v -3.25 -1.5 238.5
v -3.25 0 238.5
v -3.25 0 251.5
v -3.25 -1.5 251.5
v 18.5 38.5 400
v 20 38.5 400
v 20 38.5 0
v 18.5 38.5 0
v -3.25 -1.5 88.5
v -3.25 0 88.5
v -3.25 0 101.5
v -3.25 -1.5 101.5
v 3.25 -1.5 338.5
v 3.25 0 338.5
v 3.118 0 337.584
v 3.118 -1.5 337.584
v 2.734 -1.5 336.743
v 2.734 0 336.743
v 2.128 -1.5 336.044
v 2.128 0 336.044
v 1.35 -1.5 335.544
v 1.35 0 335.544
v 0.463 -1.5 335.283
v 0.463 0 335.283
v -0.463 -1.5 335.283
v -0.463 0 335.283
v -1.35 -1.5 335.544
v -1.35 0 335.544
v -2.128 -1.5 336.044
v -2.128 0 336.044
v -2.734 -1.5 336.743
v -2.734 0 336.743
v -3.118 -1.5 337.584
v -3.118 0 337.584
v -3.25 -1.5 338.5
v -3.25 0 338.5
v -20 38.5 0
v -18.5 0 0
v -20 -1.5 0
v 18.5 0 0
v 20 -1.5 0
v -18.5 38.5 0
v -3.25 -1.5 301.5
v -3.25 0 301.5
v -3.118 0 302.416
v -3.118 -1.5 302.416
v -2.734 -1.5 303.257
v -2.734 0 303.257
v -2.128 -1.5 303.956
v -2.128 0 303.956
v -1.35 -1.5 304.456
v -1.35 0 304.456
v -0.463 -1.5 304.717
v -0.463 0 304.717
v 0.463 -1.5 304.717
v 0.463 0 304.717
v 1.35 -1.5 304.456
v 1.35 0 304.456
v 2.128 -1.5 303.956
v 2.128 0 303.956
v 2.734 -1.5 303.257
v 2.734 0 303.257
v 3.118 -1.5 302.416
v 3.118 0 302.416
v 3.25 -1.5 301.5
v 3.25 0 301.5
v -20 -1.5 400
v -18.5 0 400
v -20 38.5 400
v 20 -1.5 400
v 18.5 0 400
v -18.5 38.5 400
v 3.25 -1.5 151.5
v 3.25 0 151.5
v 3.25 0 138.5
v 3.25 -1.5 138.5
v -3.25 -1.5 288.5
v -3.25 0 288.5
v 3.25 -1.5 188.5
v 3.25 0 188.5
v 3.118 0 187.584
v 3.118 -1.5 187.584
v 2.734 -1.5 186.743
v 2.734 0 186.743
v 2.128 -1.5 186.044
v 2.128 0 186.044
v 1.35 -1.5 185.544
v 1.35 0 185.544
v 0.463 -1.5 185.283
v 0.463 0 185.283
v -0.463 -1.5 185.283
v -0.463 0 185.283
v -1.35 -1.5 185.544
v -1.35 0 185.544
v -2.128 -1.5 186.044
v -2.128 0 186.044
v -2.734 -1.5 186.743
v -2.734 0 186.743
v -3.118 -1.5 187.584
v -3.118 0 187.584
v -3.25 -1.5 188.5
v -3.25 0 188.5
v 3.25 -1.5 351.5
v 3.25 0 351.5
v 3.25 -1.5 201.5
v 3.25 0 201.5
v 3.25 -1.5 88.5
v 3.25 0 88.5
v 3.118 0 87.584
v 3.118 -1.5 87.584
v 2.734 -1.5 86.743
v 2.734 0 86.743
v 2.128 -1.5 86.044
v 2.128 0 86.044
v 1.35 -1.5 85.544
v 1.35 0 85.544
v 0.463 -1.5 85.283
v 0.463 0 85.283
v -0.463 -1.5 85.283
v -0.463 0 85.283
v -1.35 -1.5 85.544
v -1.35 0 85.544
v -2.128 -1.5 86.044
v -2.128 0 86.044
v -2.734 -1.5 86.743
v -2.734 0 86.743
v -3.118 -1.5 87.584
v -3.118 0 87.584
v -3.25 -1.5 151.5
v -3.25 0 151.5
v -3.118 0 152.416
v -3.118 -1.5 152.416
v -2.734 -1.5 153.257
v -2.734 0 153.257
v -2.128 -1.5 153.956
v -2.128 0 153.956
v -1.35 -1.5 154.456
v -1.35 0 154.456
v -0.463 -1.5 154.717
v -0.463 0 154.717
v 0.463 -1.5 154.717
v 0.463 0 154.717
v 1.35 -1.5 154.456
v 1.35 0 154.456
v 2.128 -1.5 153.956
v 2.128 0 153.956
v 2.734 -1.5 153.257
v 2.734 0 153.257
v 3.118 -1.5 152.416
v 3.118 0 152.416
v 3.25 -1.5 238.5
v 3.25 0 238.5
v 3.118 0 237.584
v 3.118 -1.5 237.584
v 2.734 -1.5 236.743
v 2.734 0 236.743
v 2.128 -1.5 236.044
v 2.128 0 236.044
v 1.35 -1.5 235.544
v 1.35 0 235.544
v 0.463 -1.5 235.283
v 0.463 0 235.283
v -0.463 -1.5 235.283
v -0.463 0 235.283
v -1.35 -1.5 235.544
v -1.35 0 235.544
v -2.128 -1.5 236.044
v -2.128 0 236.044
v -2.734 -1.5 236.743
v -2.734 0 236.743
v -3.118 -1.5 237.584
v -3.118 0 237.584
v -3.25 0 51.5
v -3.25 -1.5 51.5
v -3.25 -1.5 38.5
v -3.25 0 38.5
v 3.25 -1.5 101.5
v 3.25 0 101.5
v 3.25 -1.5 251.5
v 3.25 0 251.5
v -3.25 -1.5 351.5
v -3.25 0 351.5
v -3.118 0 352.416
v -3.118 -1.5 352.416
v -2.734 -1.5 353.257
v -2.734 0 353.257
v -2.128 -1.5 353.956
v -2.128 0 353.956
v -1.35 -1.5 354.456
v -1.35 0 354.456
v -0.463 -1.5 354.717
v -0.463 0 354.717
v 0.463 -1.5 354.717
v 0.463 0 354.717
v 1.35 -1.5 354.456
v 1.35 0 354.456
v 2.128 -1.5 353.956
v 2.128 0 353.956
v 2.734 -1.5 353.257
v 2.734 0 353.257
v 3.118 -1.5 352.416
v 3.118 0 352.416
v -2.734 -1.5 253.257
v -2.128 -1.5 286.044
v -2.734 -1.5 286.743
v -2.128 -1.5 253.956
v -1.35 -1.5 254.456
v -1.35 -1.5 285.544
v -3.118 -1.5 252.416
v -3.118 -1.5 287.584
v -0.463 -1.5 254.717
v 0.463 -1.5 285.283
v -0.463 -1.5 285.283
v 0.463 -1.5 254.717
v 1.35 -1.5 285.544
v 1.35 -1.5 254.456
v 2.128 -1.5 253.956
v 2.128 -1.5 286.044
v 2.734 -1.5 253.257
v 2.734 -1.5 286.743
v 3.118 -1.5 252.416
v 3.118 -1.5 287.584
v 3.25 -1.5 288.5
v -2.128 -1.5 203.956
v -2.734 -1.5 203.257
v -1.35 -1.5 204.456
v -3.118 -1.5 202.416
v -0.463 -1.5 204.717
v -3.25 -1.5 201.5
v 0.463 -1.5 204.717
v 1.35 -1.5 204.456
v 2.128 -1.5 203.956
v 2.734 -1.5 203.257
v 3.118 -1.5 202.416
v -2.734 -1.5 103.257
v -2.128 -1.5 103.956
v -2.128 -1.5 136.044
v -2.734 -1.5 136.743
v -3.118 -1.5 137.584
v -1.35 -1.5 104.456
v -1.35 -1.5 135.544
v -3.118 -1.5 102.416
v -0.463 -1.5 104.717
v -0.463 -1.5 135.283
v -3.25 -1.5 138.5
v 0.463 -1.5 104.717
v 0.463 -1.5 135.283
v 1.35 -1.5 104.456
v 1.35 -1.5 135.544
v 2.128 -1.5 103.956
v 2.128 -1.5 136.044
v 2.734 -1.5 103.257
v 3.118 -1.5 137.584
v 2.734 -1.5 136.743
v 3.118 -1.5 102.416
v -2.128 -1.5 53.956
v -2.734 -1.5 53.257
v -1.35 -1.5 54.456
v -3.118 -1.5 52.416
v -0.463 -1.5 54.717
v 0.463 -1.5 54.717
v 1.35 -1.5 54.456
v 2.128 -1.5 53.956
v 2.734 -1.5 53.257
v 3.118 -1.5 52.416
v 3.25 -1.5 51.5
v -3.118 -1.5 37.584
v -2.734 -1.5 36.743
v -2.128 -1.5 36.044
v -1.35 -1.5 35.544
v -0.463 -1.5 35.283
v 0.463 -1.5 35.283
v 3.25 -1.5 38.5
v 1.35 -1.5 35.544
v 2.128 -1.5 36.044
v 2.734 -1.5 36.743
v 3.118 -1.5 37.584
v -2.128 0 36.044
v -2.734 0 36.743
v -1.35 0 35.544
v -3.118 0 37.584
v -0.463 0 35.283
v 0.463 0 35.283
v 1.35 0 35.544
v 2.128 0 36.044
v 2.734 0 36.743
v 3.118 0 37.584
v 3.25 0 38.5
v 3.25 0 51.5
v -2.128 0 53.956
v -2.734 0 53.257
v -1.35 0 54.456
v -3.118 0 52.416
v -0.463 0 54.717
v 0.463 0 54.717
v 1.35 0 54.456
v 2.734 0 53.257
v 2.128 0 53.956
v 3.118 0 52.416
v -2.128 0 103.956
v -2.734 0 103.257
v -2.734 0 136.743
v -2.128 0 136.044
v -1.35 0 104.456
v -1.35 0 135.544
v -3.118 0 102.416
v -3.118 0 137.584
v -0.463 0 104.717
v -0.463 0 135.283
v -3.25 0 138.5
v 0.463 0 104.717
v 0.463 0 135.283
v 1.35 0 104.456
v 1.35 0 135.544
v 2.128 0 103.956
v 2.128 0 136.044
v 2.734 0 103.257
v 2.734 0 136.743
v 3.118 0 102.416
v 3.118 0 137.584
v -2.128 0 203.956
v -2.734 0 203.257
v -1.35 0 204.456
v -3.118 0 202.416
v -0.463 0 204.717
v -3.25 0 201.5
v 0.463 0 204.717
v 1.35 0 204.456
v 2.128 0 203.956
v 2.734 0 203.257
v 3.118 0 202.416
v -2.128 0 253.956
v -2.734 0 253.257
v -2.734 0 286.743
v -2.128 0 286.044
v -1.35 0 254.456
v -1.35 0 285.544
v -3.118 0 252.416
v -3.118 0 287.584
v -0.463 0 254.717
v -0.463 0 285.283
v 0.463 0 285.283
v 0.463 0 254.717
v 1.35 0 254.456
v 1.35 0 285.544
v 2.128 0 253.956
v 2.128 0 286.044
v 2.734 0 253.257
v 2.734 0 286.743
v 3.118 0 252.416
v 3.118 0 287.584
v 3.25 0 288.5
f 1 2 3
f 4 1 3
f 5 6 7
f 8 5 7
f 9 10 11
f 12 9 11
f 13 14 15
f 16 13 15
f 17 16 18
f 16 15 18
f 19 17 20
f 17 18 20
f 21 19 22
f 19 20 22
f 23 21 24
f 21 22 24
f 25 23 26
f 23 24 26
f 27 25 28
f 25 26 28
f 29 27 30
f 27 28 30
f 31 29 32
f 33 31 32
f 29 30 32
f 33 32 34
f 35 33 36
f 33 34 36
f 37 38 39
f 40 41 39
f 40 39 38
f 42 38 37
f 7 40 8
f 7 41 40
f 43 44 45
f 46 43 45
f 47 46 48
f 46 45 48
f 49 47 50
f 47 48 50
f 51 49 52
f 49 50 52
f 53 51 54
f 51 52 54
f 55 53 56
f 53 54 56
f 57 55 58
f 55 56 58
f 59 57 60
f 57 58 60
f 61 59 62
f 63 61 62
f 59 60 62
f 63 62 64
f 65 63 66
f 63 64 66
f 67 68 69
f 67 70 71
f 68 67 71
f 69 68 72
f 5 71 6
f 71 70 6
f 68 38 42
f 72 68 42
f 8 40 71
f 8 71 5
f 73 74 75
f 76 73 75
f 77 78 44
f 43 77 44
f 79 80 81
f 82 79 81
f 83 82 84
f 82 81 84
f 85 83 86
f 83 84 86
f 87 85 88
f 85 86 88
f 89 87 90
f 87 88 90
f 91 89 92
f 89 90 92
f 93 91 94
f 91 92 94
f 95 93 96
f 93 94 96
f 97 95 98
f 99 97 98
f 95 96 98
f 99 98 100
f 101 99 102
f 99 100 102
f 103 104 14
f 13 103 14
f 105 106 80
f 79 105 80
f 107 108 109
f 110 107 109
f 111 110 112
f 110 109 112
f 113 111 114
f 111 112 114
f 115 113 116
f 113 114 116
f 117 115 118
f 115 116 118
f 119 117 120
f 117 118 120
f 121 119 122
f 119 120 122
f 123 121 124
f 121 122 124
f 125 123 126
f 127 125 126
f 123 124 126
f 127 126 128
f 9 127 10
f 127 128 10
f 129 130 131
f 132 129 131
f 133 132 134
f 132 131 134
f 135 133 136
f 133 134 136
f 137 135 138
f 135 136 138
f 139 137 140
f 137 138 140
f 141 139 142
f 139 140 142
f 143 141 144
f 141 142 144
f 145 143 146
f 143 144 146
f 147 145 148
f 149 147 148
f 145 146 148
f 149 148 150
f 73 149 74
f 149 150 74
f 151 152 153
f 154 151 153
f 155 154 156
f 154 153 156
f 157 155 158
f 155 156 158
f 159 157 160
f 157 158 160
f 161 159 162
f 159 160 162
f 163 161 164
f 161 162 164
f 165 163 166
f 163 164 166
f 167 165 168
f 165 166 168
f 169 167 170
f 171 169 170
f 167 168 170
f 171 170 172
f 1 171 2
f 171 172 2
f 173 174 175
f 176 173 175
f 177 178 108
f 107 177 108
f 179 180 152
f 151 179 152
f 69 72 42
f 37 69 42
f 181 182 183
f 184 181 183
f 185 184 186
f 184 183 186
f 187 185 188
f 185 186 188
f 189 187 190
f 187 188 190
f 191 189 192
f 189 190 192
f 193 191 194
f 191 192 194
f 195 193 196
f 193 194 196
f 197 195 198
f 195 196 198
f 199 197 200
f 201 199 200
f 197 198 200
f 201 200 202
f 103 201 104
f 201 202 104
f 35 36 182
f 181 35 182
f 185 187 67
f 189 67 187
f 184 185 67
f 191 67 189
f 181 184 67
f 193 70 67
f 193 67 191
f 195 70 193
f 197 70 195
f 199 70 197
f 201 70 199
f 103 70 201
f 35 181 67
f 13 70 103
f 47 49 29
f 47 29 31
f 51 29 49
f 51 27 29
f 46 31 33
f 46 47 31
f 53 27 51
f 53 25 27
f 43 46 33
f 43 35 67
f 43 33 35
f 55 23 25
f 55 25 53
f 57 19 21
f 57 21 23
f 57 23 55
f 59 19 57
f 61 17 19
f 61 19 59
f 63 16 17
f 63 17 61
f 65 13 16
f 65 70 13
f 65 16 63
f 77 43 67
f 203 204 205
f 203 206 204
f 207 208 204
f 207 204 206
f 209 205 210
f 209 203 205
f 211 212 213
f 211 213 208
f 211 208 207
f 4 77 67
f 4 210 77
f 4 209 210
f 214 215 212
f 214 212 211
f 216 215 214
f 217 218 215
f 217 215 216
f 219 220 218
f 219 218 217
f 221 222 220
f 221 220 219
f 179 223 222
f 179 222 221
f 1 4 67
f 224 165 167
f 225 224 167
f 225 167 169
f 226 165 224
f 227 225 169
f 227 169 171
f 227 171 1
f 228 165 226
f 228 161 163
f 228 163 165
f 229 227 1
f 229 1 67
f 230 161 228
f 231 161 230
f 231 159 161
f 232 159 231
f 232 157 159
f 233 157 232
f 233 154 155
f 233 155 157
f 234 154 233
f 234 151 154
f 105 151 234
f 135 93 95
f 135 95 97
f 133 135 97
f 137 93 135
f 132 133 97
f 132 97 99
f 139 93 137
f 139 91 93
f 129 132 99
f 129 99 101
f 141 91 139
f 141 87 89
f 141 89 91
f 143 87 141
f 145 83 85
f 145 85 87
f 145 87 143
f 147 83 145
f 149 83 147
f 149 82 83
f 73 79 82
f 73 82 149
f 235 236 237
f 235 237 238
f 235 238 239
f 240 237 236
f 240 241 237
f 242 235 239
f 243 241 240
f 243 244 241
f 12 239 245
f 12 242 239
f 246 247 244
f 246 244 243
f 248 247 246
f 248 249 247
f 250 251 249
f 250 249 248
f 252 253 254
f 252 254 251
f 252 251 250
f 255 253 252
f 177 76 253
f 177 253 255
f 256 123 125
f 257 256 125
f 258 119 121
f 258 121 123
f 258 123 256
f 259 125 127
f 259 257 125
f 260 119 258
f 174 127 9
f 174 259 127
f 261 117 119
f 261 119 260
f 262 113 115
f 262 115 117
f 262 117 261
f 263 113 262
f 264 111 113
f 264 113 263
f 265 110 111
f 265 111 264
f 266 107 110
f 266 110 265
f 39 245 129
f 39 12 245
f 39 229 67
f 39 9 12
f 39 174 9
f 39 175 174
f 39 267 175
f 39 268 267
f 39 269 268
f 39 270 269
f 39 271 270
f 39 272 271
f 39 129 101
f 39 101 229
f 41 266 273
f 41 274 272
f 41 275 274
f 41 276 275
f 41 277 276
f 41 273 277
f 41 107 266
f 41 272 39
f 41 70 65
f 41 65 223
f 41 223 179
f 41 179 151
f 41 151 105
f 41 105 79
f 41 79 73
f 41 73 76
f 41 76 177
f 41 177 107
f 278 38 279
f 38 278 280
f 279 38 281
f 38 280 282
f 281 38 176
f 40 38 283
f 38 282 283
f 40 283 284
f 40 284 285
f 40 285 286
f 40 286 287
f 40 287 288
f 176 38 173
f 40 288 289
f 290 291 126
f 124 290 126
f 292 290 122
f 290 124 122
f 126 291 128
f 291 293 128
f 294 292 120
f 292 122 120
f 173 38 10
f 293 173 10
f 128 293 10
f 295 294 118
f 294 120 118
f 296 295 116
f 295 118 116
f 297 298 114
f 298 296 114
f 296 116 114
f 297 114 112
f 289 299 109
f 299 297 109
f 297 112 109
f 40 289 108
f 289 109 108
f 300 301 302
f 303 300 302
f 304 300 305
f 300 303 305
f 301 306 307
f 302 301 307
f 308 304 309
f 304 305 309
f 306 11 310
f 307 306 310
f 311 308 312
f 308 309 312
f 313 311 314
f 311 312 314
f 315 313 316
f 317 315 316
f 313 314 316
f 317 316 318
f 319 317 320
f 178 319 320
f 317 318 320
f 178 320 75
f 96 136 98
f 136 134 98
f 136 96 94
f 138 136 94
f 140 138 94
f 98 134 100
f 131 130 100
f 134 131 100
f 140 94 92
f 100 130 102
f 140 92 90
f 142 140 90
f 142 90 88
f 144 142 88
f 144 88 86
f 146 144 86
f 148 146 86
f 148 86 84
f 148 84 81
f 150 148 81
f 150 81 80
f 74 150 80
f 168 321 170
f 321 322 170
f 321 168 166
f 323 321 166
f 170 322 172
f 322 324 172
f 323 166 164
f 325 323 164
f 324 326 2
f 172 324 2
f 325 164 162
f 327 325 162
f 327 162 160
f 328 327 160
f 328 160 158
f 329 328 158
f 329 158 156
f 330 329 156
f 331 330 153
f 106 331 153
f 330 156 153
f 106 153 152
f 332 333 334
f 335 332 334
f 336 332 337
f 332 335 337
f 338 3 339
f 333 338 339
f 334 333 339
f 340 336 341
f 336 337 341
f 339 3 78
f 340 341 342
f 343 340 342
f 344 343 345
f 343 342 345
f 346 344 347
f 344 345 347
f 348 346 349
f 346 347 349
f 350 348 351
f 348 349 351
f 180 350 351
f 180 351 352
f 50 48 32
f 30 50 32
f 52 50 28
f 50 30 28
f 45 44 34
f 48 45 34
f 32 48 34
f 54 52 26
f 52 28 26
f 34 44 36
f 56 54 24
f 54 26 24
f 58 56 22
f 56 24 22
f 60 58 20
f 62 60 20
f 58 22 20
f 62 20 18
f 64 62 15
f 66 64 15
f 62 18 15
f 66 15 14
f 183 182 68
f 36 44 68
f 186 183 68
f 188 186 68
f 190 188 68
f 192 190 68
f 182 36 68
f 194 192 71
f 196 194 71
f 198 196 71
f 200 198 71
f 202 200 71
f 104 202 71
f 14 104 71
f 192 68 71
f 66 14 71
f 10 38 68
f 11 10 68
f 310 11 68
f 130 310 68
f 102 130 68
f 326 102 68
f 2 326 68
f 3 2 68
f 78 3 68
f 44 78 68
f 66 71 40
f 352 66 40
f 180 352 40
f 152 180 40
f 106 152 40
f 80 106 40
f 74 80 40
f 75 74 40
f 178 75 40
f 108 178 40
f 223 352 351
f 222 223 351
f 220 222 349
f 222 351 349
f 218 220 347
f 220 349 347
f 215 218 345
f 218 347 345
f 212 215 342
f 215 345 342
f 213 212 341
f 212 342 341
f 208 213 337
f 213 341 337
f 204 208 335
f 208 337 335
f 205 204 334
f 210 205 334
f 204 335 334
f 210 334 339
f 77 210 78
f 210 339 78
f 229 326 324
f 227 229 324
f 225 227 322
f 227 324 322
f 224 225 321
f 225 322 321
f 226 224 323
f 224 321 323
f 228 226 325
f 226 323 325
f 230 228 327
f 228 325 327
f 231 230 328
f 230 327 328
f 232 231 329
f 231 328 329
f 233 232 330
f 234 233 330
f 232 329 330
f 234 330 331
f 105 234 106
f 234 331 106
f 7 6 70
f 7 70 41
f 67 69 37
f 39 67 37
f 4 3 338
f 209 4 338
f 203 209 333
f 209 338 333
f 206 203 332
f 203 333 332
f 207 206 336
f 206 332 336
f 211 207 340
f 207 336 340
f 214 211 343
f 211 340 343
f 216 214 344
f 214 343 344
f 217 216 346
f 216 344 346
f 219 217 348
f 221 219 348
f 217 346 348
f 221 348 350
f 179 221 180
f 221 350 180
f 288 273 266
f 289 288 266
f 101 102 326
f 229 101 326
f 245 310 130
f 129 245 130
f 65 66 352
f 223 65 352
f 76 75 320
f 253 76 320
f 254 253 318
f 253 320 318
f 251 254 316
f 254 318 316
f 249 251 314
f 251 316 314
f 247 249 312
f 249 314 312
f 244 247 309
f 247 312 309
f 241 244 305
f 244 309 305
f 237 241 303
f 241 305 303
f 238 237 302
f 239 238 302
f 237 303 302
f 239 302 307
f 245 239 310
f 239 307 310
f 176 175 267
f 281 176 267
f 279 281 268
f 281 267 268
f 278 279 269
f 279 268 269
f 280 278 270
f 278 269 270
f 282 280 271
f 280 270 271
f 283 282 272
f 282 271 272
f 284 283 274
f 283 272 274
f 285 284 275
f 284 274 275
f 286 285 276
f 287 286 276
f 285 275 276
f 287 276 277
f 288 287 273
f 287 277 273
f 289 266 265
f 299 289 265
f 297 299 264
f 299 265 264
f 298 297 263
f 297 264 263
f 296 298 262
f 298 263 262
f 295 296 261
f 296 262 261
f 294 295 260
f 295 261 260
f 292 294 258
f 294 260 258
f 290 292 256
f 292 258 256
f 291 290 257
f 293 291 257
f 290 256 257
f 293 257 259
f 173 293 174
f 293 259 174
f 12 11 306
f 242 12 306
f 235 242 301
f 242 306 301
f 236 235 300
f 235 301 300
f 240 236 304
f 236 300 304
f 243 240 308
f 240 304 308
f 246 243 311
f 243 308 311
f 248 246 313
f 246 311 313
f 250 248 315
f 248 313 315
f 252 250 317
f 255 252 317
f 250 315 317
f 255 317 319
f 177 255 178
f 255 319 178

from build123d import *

# Parameters (mm, degrees)
CROQUIS1_W              = 400
CROQUIS1_H              = 40
SALIENTE_EXTRUIR1_DEPTH = 40
CROQUIS2_W              = 37
CROQUIS2_H              = 38.5
CORTAR_EXTRUIR1_DEPTH   = 401
CORTAR_EXTRUIR2_DEPTH   = 2.5
CORTAR_EXTRUIR3_DEPTH   = 2.5
CORTAR_EXTRUIR4_DEPTH   = 2.5
CORTAR_EXTRUIR5_DEPTH   = 2.5
CORTAR_EXTRUIR6_DEPTH   = 2.5
CORTAR_EXTRUIR7_DEPTH   = 2.5
CORTAR_EXTRUIR8_DEPTH   = 41


with BuildPart() as part:
    # Croquis1 → Saliente-Extruir1 (new body)
    with BuildSketch(Plane(origin=(20, 0, 0), x_dir=(0, 0, -1), z_dir=(1, 0, 0))):
        with Locations((-200, 18.5)):
            Rectangle(CROQUIS1_W, CROQUIS1_H)
    extrude(amount=-SALIENTE_EXTRUIR1_DEPTH)

    # Croquis2 → Cortar-Extruir1 (cut, through all)
    with BuildSketch(Plane.XY.offset(400)):
        with Locations((0, 19.25)):
            Rectangle(CROQUIS2_W, CROQUIS2_H)
    extrude(amount=-CORTAR_EXTRUIR1_DEPTH, mode=Mode.SUBTRACT)

    # Croquis3 → Cortar-Extruir2 (cut, through all)
    with BuildSketch(Plane(origin=(0, 0, 0), x_dir=(-1, 0, 0), z_dir=(0, 1, 0))):
        with BuildLine():
            Line((-3.25, 351.5), (-3.25, 338.5))
            ThreePointArc((-3.25, 338.5), (0, 335.25), (3.25, 338.5))
            Line((3.25, 338.5), (3.25, 351.5))
            ThreePointArc((3.25, 351.5), (0, 354.75), (-3.25, 351.5))
        make_face()
    extrude(amount=-CORTAR_EXTRUIR2_DEPTH, mode=Mode.SUBTRACT)

    # Croquis4 → Cortar-Extruir3 (cut, through all)
    with BuildSketch(Plane(origin=(0, 0, 0), x_dir=(-1, 0, 0), z_dir=(0, 1, 0))):
        with BuildLine():
            Line((-3.25, 301.5), (-3.25, 288.5))
            ThreePointArc((-3.25, 288.5), (0, 285.25), (3.25, 288.5))
            Line((3.25, 288.5), (3.25, 301.5))
            ThreePointArc((3.25, 301.5), (0, 304.75), (-3.25, 301.5))
        make_face()
    extrude(amount=-CORTAR_EXTRUIR3_DEPTH, mode=Mode.SUBTRACT)

    # Croquis5 → Cortar-Extruir4 (cut, through all)
    with BuildSketch(Plane(origin=(0, 0, 0), x_dir=(-1, 0, 0), z_dir=(0, 1, 0))):
        with BuildLine():
            Line((-3.25, 251.5), (-3.25, 238.5))
            ThreePointArc((-3.25, 238.5), (0, 235.25), (3.25, 238.5))
            Line((3.25, 238.5), (3.25, 251.5))
            ThreePointArc((3.25, 251.5), (0, 254.75), (-3.25, 251.5))
        make_face()
    extrude(amount=-CORTAR_EXTRUIR4_DEPTH, mode=Mode.SUBTRACT)

    # Croquis6 → Cortar-Extruir5 (cut, through all)
    with BuildSketch(Plane(origin=(0, 0, 0), x_dir=(-1, 0, 0), z_dir=(0, 1, 0))):
        with BuildLine():
            Line((-3.25, 201.5), (-3.25, 188.5))
            ThreePointArc((-3.25, 188.5), (0, 185.25), (3.25, 188.5))
            Line((3.25, 188.5), (3.25, 201.5))
            ThreePointArc((3.25, 201.5), (0, 204.75), (-3.25, 201.5))
        make_face()
    extrude(amount=-CORTAR_EXTRUIR5_DEPTH, mode=Mode.SUBTRACT)

    # Croquis7 → Cortar-Extruir6 (cut, through all)
    with BuildSketch(Plane(origin=(0, 0, 0), x_dir=(-1, 0, 0), z_dir=(0, 1, 0))):
        with BuildLine():
            Line((-3.25, 151.5), (-3.25, 138.5))
            ThreePointArc((-3.25, 138.5), (0, 135.25), (3.25, 138.5))
            Line((3.25, 138.5), (3.25, 151.5))
            ThreePointArc((3.25, 151.5), (0, 154.75), (-3.25, 151.5))
        make_face()
    extrude(amount=-CORTAR_EXTRUIR6_DEPTH, mode=Mode.SUBTRACT)

    # Croquis8 → Cortar-Extruir7 (cut, through all)
    with BuildSketch(Plane(origin=(0, 0, 0), x_dir=(-1, 0, 0), z_dir=(0, 1, 0))):
        with BuildLine():
            Line((-3.25, 101.5), (-3.25, 88.5))
            ThreePointArc((-3.25, 88.5), (0, 85.25), (3.25, 88.5))
            Line((3.25, 88.5), (3.25, 101.5))
            ThreePointArc((3.25, 101.5), (0, 104.75), (-3.25, 101.5))
        make_face()
    extrude(amount=-CORTAR_EXTRUIR7_DEPTH, mode=Mode.SUBTRACT)

    # Croquis9 → Cortar-Extruir8 (cut, through all)
    with BuildSketch(Plane.XZ.offset(1.5)):
        with BuildLine():
            Line((-3.25, 51.5), (-3.25, 38.5))
            ThreePointArc((-3.25, 38.5), (0, 35.25), (3.25, 38.5))
            Line((3.25, 38.5), (3.25, 51.5))
            ThreePointArc((3.25, 51.5), (0, 54.75), (-3.25, 51.5))
        make_face()
    extrude(amount=-CORTAR_EXTRUIR8_DEPTH, mode=Mode.SUBTRACT)


solid = part.part
